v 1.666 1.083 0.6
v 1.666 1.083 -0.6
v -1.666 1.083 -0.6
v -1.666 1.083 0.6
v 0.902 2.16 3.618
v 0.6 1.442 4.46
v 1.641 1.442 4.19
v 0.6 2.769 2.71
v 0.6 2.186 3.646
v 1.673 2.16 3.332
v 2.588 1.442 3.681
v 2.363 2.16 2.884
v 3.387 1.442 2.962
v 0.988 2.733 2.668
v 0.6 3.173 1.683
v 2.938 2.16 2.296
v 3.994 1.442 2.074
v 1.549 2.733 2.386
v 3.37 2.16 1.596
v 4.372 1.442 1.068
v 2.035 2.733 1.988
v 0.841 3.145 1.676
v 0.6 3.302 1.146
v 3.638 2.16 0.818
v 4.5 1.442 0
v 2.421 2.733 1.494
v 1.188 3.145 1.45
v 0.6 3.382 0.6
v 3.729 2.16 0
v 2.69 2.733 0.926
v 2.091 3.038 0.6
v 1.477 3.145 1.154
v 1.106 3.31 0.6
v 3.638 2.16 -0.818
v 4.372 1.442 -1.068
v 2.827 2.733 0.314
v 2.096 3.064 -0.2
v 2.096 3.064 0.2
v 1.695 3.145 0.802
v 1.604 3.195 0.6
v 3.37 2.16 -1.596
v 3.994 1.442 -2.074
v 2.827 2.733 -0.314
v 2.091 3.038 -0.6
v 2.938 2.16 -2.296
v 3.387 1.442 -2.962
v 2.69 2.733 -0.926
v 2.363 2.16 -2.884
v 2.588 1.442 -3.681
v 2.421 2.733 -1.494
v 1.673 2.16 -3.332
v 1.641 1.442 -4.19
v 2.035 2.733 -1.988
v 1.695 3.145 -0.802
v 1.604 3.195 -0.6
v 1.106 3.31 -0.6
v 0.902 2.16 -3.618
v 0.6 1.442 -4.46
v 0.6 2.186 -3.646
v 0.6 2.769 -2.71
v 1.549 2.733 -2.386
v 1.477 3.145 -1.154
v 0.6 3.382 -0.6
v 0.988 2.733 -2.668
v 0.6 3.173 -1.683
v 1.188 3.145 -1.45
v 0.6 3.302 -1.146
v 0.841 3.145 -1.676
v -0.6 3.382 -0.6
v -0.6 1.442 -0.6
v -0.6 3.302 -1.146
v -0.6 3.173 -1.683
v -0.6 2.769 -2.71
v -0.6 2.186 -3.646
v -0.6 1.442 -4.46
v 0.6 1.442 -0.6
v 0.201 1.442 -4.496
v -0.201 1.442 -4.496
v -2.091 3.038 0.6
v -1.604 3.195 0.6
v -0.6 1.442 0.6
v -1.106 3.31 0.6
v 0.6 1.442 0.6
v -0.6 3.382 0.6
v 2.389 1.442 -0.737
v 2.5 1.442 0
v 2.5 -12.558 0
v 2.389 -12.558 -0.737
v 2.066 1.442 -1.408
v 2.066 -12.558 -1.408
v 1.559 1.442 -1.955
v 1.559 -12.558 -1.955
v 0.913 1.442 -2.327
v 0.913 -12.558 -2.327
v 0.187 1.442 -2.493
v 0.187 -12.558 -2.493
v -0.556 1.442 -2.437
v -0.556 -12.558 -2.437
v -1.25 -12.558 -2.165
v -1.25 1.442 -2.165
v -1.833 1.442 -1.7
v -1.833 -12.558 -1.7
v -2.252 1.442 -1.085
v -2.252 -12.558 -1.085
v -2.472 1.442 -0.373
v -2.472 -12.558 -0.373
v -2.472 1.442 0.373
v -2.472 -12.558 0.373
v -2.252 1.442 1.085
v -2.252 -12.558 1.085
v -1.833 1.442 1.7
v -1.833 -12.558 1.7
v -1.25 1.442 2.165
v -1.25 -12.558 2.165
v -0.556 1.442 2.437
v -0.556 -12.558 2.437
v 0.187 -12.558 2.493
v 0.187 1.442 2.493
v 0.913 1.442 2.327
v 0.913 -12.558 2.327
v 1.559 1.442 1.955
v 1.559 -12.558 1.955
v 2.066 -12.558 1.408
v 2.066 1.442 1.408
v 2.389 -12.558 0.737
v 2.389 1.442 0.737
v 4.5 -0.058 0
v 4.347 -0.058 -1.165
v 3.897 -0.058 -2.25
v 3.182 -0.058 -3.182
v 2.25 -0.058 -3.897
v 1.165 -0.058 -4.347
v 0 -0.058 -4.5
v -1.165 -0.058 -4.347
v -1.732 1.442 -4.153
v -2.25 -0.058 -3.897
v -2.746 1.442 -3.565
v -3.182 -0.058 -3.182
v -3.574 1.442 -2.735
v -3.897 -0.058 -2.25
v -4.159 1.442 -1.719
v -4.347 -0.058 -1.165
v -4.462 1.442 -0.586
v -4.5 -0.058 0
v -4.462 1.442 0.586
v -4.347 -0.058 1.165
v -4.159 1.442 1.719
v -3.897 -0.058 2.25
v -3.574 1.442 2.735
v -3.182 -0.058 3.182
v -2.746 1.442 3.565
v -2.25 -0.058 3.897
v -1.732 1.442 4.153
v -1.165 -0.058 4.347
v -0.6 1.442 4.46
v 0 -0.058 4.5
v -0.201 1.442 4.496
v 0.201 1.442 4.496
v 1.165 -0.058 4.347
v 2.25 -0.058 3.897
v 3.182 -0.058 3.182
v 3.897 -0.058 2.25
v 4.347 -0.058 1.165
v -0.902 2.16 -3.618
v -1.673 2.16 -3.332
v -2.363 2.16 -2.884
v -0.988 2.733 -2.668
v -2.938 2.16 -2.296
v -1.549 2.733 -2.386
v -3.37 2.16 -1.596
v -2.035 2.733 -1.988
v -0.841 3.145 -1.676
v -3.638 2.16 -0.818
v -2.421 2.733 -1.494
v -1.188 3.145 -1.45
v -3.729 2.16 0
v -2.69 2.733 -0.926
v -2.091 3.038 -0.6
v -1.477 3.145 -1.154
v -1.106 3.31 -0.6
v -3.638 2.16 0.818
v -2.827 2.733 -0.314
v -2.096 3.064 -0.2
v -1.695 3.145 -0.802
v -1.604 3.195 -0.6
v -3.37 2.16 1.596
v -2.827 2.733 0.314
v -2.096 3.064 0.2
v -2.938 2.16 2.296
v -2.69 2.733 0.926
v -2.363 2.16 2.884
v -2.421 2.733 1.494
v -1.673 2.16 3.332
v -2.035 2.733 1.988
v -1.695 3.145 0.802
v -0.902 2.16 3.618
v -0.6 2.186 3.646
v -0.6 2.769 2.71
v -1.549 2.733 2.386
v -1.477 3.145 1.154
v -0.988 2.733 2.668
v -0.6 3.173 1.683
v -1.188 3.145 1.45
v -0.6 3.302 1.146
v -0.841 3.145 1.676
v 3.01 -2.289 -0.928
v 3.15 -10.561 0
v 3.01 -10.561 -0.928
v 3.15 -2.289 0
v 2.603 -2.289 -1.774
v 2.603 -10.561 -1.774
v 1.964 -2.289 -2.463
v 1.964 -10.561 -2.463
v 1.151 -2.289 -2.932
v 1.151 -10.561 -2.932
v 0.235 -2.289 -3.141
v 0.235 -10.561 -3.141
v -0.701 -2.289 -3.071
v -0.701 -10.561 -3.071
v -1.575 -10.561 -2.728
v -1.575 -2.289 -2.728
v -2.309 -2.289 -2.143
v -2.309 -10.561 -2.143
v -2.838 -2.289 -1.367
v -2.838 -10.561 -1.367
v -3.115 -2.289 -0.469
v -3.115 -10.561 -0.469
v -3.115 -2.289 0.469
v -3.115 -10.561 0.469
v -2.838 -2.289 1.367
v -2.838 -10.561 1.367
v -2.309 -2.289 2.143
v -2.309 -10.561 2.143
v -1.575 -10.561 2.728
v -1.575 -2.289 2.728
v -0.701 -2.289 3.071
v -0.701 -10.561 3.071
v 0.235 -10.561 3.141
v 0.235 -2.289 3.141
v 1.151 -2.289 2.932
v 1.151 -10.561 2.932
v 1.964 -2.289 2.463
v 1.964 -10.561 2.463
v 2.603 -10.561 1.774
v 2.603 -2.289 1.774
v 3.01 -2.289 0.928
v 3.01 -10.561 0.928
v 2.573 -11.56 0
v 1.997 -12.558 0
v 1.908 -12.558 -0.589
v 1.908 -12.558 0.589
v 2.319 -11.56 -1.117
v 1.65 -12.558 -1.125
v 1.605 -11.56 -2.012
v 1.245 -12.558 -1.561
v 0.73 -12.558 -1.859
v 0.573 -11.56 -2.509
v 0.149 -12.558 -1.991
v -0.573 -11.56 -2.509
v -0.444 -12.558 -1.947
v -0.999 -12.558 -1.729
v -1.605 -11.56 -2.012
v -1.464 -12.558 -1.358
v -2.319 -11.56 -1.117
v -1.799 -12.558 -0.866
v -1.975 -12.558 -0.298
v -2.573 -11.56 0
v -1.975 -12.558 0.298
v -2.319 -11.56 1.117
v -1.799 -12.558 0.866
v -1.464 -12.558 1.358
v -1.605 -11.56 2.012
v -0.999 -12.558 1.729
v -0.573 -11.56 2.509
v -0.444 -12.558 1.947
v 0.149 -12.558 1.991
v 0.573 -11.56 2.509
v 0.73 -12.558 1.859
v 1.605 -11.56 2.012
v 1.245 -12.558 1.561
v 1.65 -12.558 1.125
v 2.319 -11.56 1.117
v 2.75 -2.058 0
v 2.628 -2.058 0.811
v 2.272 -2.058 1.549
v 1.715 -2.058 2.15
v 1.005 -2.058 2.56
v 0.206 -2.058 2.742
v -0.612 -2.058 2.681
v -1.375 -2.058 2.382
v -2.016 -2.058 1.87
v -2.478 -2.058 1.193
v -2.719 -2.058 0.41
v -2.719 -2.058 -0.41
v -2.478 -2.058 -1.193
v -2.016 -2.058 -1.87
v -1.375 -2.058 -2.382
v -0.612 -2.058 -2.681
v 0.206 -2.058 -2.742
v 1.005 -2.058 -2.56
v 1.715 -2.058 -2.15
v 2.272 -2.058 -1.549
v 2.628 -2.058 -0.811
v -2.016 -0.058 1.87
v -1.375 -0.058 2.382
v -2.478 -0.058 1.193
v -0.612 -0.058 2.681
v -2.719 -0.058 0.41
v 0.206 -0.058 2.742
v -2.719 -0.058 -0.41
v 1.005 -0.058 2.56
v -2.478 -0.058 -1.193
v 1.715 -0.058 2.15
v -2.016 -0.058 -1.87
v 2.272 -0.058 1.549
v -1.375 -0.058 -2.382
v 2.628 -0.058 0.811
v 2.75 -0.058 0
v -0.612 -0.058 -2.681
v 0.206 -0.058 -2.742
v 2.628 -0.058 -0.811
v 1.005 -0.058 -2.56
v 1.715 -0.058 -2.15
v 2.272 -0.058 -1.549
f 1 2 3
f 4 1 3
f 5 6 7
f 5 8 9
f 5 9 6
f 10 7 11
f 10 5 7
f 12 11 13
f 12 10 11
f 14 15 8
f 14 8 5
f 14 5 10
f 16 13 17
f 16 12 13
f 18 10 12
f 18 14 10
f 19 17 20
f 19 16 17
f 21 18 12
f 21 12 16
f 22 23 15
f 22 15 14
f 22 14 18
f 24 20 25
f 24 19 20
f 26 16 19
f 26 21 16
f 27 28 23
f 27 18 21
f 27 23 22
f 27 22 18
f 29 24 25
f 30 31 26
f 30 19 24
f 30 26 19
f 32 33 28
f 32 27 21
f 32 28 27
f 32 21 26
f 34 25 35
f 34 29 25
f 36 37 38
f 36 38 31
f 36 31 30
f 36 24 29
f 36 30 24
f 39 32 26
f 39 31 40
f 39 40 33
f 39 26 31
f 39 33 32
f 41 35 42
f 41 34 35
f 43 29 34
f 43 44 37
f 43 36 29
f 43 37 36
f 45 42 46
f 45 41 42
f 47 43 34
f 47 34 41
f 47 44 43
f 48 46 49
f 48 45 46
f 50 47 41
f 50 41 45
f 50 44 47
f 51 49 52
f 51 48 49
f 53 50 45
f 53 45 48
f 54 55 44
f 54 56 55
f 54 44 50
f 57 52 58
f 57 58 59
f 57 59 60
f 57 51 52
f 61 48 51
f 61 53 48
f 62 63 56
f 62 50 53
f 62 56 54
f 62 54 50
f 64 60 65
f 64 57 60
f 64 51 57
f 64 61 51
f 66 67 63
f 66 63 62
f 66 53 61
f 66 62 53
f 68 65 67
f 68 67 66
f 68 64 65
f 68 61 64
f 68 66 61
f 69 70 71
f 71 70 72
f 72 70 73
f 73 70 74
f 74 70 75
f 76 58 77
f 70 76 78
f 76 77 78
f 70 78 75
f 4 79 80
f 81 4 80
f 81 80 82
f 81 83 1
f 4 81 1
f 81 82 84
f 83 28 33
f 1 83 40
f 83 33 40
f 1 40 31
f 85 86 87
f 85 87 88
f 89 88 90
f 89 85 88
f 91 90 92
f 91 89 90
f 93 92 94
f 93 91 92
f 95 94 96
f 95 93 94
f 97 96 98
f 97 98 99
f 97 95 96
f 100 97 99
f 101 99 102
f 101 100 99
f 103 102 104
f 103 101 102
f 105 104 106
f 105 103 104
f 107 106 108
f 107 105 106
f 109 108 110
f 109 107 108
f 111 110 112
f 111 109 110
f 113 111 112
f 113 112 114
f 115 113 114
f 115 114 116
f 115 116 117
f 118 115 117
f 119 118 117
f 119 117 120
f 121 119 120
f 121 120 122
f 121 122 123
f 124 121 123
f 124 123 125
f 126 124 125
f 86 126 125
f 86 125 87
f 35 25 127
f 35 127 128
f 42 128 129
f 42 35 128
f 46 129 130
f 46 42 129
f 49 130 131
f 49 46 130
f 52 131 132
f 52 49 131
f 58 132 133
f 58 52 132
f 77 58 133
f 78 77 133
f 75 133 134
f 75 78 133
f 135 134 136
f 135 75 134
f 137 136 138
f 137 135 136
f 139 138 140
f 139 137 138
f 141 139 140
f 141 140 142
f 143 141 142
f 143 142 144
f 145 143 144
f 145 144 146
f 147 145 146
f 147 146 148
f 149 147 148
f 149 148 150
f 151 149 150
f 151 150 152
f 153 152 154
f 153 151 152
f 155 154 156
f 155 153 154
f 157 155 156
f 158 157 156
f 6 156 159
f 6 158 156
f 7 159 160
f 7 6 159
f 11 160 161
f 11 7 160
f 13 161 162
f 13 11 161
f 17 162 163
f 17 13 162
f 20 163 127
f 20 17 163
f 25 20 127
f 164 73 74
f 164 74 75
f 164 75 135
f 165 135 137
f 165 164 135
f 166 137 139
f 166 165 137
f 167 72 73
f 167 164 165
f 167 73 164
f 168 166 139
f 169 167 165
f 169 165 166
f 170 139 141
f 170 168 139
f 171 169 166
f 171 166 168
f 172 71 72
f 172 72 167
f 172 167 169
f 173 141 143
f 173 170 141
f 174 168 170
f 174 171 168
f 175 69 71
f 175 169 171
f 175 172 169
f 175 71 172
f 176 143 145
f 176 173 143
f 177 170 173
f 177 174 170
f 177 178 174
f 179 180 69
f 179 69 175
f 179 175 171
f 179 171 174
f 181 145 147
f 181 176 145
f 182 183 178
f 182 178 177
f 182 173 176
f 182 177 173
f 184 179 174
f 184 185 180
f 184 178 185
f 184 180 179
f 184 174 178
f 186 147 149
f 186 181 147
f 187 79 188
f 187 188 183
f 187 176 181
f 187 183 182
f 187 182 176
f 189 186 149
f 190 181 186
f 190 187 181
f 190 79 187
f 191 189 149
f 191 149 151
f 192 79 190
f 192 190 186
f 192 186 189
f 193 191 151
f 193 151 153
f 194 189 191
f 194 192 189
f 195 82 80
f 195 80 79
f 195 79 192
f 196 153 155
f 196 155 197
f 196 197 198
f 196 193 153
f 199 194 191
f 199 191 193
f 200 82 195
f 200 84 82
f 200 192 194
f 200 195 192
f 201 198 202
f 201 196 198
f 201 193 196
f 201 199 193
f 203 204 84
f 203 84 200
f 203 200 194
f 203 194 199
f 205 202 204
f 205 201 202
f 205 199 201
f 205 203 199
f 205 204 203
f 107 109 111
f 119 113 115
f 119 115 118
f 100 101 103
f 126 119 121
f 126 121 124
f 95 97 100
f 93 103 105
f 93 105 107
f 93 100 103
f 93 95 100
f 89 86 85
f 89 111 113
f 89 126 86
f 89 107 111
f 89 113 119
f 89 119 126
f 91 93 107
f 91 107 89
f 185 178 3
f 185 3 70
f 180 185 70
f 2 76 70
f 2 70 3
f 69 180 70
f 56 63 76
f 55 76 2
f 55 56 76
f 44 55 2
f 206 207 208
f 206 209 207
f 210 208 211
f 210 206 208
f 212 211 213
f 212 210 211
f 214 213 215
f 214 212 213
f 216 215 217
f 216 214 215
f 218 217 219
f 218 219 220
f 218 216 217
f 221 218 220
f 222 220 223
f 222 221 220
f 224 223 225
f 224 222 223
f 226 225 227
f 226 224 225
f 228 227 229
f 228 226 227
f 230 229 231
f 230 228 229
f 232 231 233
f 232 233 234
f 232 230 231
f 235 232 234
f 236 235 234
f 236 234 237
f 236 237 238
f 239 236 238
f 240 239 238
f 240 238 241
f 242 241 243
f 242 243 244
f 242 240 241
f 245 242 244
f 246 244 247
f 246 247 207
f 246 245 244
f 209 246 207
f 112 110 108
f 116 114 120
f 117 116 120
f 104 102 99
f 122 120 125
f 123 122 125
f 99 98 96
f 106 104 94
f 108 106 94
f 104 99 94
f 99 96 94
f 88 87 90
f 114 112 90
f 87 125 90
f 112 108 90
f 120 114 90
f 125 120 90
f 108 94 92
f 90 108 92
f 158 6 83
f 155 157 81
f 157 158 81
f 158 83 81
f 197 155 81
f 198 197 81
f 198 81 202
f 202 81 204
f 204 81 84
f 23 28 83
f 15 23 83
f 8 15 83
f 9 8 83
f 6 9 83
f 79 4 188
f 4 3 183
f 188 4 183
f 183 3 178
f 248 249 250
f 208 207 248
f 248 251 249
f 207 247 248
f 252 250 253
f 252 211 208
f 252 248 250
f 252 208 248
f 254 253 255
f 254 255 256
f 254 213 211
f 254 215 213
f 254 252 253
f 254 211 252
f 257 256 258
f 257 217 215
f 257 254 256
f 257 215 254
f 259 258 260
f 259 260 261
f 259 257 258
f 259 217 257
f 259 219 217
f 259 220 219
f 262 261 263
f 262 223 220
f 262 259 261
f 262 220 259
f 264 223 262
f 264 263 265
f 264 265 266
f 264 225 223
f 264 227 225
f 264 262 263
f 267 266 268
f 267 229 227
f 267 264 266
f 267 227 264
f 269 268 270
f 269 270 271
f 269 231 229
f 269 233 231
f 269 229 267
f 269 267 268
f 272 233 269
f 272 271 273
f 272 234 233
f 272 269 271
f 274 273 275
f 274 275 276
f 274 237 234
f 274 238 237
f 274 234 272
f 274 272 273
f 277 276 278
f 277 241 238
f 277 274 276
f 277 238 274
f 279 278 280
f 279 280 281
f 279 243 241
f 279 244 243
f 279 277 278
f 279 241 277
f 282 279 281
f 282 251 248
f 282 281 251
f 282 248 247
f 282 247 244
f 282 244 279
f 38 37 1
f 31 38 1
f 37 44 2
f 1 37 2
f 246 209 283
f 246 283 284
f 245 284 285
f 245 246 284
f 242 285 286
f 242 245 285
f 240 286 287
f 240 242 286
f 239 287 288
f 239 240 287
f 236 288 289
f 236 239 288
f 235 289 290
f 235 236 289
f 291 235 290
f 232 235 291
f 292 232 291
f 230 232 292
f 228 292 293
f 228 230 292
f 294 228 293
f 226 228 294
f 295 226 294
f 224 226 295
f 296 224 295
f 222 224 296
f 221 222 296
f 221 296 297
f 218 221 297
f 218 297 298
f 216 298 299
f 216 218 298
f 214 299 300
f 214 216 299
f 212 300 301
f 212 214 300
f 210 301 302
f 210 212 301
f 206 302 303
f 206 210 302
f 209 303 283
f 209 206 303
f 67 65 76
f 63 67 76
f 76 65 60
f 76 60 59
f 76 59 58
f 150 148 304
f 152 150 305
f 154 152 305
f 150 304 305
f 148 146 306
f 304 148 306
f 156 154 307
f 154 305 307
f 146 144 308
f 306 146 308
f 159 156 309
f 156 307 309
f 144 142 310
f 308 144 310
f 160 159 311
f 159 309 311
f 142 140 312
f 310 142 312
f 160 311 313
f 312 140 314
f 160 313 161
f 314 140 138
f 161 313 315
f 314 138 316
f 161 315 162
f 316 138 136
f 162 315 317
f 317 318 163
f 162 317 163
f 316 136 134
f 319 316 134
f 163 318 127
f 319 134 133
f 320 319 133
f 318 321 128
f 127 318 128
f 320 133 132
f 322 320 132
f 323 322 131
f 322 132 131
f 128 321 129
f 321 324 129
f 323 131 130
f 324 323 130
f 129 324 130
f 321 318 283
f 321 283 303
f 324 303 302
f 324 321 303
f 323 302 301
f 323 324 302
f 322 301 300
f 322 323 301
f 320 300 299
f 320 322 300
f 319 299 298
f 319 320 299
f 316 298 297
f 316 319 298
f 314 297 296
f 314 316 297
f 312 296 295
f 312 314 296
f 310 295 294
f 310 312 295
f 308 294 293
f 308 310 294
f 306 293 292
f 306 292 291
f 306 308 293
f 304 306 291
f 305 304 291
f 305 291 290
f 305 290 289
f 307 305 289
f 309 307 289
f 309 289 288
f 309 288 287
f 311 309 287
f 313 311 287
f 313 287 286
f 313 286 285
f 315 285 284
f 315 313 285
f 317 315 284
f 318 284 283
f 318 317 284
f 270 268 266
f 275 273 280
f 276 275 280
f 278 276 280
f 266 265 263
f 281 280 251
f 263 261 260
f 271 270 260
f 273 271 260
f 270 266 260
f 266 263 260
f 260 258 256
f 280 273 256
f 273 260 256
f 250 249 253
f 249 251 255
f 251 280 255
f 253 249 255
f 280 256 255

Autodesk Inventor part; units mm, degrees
ref_plane "YZ Plane" through (0, 0, 0) normal (1, 0, 0) x (0, 1, 0)
ref_plane "XZ Plane" through (0, 0, 0) normal (0, 1, 0) x (-1, 0, 0)
ref_plane "XY Plane" through (0, 0, 0) normal (0, 0, 1) x (1, 0, 0)
sketch "Sketch1" plane through (0, 0, 0) normal (0, 0, 1) x (1, 0, 0)
  line L0 (3.15, -10.5612) -> (3.15, -2.2892)
  line L1 (1.997, -12.5582) -> (3.15, -10.5612)
  line L2 (0, -12.5582) -> (1.997, -12.5582)
  line L3 (0, -20.7284) -> (0, -13.6389) construction
  line L4 (0, -12.5582) -> (0, 3.4418)
  line L5 (2.6537, 0) -> (-1.8059, 0)
  line L6 (2.75, -2.0582) -> (2.75, -0.0582)
  line L7 (2.75, -0.0582) -> (4.5, -0.0582)
  line L8 (7.0831, -0.0582) -> (2.8831, -0.0582)
  arc A0 (4.5, 1.4418) -> (0, 3.4418) centre (0, -2.6207) ccw
  line L9 (4.5, -0.0582) -> (4.5, 1.4418)
  line L10 (3.15, -2.2892) -> (2.75, -2.0582)
  point P0 (0, 0)
  point P1 (0, -3.5)
  point P2 (0, -3.5)
  point P3 (0, 0.0007)
  point P4 (0.4239, 0)
  dimension "d0" = 6.3
  dimension "d1" = 5.5
  dimension "d2" = 2
  dimension "d4" = 16
  dimension "d5" = 9
  dimension "d6" = 1.5
  dimension "d7" = 30
  dimension "d8" = 1.153
  dimension "d9" = 3.4418
revolve "Revolution1" add sketch "Sketch1" angle 360 about axis through (0, -12.5582, 0) along (0, 1, 0)
sketch "Sketch2" plane through (0, 0, 0) normal (0, 0, 1) x (1, 0, 0)
  line L0 (-0.6, 3.4418) -> (0.6, 3.4418)
  line L1 (0.6, 3.4418) -> (0.6, 1.4418)
  line L2 (0.6, 1.4418) -> (-0.6, 1.4418)
  line L3 (-0.6, 1.4418) -> (-0.6, 3.4418)
  arc A0 (4.5, 1.4418) -> (-4.5, 1.4418) centre (0, -2.6207) ccw projected
  point P0 (0, 0)
  point P1 (0, 3.4418)
  dimension "d11" = 1.2
  dimension "d12" = 2
extrude "Extrusion1" cut sketch "Sketch2" along normal through all both and the other way through all
sketch "Sketch3" plane through (0, 0, 0) normal (0, 0, 1) x (1, 0, 0)
  line L0 (-2.2353, 3.7038) -> (2.2353, 3.7038)
  line L1 (2.2353, 3.7038) -> (1.666, 1.0827)
  line L2 (1.666, 1.0827) -> (-1.666, 1.0827)
  line L3 (-1.666, 1.0827) -> (-2.2353, 3.7038)
  point P0 (0, 0)
  point P1 (0, 3.7038)
  point P2 (0, 1.0827)
extrude "Extrusion2" cut sketch "Sketch3" along normal mid plane 1.2
thread "Thread1" size "M7x1" class "6g" standard "ISO Metric profile" full length
sketch "Sketch4" plane through (0, 1.4418, 0) normal (0, 1, 0) x (1, 0, 0)
  arc A0 (-0.6, -4.4598) -> (0.6, -4.4598) centre (0, 0) ccw projected
  circle A1 centre (0, 0) radius 2.5
  point P0 (-0.6, -3.4482)
  point P1 (0.6, -3.4482)
  dimension "d19" = 5
extrude "Extrusion3" add sketch "Sketch4" against normal up to surface (14 mm away) separate body
equation "\"d0\" = Thread_diameter"
equation "\"d4\" = Length"
equation "\"d5\" = Head_Diameter"
equation "\"Head_Diameter\" = 9"
equation "\"Thread_diameter\" = 6.3"
equation "\"Length\" = 16"
properties part number "EuroScrew D9 L16 H"
